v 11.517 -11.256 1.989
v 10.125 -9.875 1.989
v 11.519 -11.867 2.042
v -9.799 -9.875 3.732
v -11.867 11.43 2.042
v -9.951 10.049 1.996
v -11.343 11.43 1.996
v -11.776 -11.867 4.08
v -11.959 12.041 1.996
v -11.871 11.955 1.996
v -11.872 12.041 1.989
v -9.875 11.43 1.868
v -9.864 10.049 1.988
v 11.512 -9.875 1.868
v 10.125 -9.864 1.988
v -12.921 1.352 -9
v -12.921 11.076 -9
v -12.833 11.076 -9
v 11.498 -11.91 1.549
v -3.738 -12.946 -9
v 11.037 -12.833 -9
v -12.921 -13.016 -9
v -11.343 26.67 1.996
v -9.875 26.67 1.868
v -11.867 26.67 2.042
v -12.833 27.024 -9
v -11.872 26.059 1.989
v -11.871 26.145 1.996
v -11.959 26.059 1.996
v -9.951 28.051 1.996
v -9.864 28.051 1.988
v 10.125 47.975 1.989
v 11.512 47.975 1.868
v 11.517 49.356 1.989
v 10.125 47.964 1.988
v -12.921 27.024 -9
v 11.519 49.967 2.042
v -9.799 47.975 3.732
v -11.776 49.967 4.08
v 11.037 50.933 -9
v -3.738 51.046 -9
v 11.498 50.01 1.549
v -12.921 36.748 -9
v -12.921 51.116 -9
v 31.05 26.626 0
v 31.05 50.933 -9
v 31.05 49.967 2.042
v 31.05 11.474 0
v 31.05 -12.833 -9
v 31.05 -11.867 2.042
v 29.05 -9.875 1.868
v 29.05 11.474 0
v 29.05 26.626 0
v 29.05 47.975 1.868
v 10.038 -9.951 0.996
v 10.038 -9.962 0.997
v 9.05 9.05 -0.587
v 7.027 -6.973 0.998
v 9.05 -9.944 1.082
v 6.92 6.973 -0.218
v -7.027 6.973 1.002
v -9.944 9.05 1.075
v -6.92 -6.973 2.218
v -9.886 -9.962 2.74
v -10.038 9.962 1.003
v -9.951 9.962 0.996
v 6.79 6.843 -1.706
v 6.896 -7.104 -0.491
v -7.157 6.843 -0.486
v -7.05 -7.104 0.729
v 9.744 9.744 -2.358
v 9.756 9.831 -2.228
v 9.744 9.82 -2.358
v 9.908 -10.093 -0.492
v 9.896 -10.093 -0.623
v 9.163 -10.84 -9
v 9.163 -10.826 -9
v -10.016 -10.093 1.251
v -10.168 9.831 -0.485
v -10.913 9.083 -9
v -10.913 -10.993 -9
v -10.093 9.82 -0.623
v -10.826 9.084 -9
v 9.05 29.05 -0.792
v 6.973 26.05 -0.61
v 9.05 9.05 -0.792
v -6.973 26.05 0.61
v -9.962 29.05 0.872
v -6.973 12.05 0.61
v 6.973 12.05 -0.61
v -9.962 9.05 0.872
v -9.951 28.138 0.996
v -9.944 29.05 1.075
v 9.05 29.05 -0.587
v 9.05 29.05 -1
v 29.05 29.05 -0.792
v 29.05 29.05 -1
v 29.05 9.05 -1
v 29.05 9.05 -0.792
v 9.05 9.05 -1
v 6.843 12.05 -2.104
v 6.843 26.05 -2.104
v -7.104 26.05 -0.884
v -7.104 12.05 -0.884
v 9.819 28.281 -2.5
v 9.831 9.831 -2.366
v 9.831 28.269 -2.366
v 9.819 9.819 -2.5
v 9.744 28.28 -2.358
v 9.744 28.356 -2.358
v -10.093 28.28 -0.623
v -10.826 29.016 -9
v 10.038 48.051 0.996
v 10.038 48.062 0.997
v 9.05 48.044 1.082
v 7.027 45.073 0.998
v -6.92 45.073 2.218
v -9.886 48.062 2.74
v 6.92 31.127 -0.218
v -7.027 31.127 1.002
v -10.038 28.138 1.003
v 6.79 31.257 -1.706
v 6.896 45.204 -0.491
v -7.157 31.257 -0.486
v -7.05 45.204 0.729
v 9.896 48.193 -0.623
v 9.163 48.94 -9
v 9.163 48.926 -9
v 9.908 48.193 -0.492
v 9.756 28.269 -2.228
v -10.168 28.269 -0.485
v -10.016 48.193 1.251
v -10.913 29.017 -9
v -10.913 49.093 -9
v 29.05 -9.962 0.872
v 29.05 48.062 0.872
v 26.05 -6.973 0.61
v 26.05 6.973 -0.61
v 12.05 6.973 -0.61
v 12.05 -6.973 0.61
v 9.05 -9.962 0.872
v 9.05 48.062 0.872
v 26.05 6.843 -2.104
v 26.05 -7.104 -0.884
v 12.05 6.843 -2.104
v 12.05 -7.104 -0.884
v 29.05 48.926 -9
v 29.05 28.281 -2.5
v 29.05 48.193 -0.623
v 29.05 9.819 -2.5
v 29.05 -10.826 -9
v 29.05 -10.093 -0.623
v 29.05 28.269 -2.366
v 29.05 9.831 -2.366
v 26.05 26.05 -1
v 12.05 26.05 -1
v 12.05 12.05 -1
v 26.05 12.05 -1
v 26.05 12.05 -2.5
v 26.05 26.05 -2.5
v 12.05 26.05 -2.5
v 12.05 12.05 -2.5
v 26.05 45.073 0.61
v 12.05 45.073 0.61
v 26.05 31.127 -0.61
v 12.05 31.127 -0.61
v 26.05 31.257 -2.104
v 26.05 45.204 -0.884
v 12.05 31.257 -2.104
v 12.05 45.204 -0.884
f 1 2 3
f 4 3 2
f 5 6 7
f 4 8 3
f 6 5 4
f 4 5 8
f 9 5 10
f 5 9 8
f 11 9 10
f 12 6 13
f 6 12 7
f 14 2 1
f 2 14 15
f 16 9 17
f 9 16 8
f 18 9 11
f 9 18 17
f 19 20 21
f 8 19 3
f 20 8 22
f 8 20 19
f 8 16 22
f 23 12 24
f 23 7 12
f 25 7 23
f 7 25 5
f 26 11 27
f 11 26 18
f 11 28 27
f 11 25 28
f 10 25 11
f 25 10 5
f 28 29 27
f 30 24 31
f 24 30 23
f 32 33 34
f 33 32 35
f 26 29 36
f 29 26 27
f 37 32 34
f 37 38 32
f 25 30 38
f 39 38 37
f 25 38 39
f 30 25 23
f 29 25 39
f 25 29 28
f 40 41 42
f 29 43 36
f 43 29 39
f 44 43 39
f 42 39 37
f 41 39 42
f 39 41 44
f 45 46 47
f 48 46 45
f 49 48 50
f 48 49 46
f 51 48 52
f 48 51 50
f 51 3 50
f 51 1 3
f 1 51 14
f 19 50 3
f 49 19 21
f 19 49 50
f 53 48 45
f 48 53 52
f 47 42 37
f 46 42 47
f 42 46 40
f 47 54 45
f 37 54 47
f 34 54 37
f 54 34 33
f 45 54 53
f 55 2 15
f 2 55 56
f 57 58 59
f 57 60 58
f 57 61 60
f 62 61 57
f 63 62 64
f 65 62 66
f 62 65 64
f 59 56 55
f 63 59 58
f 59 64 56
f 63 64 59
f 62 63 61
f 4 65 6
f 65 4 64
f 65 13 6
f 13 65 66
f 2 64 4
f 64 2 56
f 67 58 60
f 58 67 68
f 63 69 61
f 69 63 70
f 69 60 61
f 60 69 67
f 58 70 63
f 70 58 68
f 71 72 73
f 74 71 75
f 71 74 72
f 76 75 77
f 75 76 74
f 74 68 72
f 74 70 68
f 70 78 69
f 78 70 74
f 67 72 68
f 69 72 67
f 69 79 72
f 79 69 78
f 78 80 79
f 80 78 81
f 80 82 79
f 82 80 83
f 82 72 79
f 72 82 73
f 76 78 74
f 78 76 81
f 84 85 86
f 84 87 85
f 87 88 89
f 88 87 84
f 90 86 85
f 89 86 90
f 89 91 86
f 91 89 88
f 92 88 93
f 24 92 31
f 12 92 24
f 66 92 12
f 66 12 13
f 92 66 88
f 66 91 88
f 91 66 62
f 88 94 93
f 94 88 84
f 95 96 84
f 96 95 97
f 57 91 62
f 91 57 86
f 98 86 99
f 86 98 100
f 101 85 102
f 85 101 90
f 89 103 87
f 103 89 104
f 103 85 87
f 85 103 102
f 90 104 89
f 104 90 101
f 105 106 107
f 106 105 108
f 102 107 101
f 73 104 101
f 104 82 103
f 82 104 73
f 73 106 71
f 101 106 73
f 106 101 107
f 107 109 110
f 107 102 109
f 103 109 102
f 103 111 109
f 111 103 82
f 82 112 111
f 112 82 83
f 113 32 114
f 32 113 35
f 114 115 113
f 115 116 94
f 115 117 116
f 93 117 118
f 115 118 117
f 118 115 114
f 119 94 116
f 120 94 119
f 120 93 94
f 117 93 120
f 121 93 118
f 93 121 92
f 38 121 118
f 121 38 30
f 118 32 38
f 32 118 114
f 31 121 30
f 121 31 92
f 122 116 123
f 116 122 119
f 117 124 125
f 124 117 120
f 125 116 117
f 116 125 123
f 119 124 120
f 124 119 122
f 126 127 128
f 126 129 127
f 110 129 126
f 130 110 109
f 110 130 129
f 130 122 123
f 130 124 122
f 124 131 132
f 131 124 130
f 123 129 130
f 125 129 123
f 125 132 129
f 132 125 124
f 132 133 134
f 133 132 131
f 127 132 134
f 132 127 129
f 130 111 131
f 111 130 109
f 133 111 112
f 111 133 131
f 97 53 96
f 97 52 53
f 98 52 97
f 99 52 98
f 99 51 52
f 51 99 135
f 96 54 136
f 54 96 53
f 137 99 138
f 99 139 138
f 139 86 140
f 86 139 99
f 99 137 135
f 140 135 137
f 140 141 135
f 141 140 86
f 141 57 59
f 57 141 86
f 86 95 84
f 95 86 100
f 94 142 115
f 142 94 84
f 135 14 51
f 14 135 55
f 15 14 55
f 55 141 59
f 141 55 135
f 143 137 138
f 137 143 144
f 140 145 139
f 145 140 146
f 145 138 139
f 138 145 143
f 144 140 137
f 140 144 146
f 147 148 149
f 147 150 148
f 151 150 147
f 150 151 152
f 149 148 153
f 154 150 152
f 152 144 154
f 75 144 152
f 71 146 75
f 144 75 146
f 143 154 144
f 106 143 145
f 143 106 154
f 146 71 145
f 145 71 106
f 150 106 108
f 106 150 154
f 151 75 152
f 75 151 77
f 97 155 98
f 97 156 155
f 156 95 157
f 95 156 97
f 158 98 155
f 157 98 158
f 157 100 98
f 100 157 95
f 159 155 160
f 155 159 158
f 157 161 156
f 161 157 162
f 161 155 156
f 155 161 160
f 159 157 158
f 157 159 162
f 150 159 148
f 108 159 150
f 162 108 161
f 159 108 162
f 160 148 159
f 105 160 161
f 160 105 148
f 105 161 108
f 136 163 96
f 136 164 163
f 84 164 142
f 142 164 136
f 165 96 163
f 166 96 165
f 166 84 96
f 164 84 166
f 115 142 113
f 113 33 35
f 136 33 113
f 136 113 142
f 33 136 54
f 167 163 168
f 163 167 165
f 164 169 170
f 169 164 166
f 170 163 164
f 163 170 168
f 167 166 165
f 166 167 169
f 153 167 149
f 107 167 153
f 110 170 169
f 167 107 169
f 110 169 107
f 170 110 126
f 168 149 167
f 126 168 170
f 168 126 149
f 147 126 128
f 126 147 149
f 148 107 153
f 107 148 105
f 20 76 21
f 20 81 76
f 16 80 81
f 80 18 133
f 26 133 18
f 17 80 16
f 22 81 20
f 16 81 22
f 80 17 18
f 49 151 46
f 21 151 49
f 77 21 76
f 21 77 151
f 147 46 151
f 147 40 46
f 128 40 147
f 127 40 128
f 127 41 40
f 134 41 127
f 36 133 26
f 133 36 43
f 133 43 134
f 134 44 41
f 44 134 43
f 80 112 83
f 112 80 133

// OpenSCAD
// Generated by SolidPython 1.1.3 on 2024-12-14 22:49:28


difference() {
	union() {
		translate(v = [0.0000000000, 0.0000000000, 1]) {
			rotate(a = [-5, 5, 0]) {
				translate(v = [-12, -12, -19]) {
					cube(size = [24, 24, 20]);
				}
			}
		}
		translate(v = [0.0000000000, 19.0500000000, 0]) {
			rotate(a = [0, 5, 0]) {
				translate(v = [-12, -12, -19]) {
					cube(size = [24, 24, 20]);
				}
			}
		}
		translate(v = [0.0000000000, 38.1000000000, 1]) {
			rotate(a = [5, 5, 0]) {
				translate(v = [-12, -12, -19]) {
					cube(size = [24, 24, 20]);
				}
			}
		}
		translate(v = [19.0500000000, 0.0000000000, 0]) {
			rotate(a = [-5, 0, 0]) {
				translate(v = [-12, -12, -19]) {
					cube(size = [24, 24, 20]);
				}
			}
		}
		translate(v = [19.0500000000, 19.0500000000, -1]) {
			rotate(a = [0, 0, 0]) {
				translate(v = [-12, -12, -19]) {
					cube(size = [24, 24, 20]);
				}
			}
		}
		translate(v = [19.0500000000, 38.1000000000, 0]) {
			rotate(a = [5, 0, 0]) {
				translate(v = [-12, -12, -19]) {
					cube(size = [24, 24, 20]);
				}
			}
		}
	}
	union() {
		translate(v = [0.0000000000, 0.0000000000, 1]) {
			rotate(a = [-5, 5, 0]) {
				union() {
					translate(v = [-10, -10, 0]) {
						cube(size = [20, 20, 10]);
					}
					translate(v = [-7, -7, -49]) {
						cube(size = [14, 14, 50]);
					}
					translate(v = [-10, -10, -51.5000000000]) {
						cube(size = [20, 20, 50]);
					}
				}
			}
		}
		translate(v = [0.0000000000, 19.0500000000, 0]) {
			rotate(a = [0, 5, 0]) {
				union() {
					translate(v = [-10, -10, 0]) {
						cube(size = [20, 20, 10]);
					}
					translate(v = [-7, -7, -49]) {
						cube(size = [14, 14, 50]);
					}
					translate(v = [-10, -10, -51.5000000000]) {
						cube(size = [20, 20, 50]);
					}
				}
			}
		}
		translate(v = [0.0000000000, 38.1000000000, 1]) {
			rotate(a = [5, 5, 0]) {
				union() {
					translate(v = [-10, -10, 0]) {
						cube(size = [20, 20, 10]);
					}
					translate(v = [-7, -7, -49]) {
						cube(size = [14, 14, 50]);
					}
					translate(v = [-10, -10, -51.5000000000]) {
						cube(size = [20, 20, 50]);
					}
				}
			}
		}
		translate(v = [19.0500000000, 0.0000000000, 0]) {
			rotate(a = [-5, 0, 0]) {
				union() {
					translate(v = [-10, -10, 0]) {
						cube(size = [20, 20, 10]);
					}
					translate(v = [-7, -7, -49]) {
						cube(size = [14, 14, 50]);
					}
					translate(v = [-10, -10, -51.5000000000]) {
						cube(size = [20, 20, 50]);
					}
				}
			}
		}
		translate(v = [19.0500000000, 19.0500000000, -1]) {
			rotate(a = [0, 0, 0]) {
				union() {
					translate(v = [-10, -10, 0]) {
						cube(size = [20, 20, 10]);
					}
					translate(v = [-7, -7, -49]) {
						cube(size = [14, 14, 50]);
					}
					translate(v = [-10, -10, -51.5000000000]) {
						cube(size = [20, 20, 50]);
					}
				}
			}
		}
		translate(v = [19.0500000000, 38.1000000000, 0]) {
			rotate(a = [5, 0, 0]) {
				union() {
					translate(v = [-10, -10, 0]) {
						cube(size = [20, 20, 10]);
					}
					translate(v = [-7, -7, -49]) {
						cube(size = [14, 14, 50]);
					}
					translate(v = [-10, -10, -51.5000000000]) {
						cube(size = [20, 20, 50]);
					}
				}
			}
		}
	}
	translate(v = [-20, -20, -29]) {
		cube(size = [100, 100, 20]);
	}
}
/***********************************************
*********      SolidPython code:      **********
************************************************
 
from solid import *

# ケースになる部分
body = translate([-12, -12, -19])(
    cube([24, 24, 20])
)

# ケースからカットする部分
hole = union()(
    # スイッチの上側をカットする部分
    translate([-10, -10, 0])(
        cube([20, 20, 10])
    ),
    # スイッチの穴
    translate([-7, -7, -49])(
        cube([14, 14, 50])
    ),
    # スイッチプレートの下側
    translate([-10, -10, -51.5])(
        cube([20, 20, 50])
    ),
)

# スイッチの位置 x, y, z と角度[度] rx, ry
position = [
    [19.05 * 0, 19.05 * 0,  1, -5, 5],
    [19.05 * 0, 19.05 * 1,  0,  0, 5],
    [19.05 * 0, 19.05 * 2,  1,  5, 5],
    [19.05 * 1, 19.05 * 0,  0, -5, 0],
    [19.05 * 1, 19.05 * 1, -1,  0, 0],
    [19.05 * 1, 19.05 * 2,  0,  5, 0],
]

# ケースを合体
case6 = union()(
    [
        translate([x, y, z])(
            rotate([rx, ry, 0])(body)
        ) for x, y, z, rx, ry in position
    ]
)

# カット部分を合体
hole6 = union()(
    [
        translate([x, y, z])(
            rotate([rx, ry, 0])(hole)
        ) for x, y, z, rx, ry in position
    ]
)

# ケースの底を平らにカットするための立方体
bottom = translate([-20, -20, -29])(
  cube([100, 100, 20])
)

# ケースからカット部分を引く
kbd = difference()(
  case6,
  hole6,
  bottom
)

scad_render_to_file(kbd, '7_6keys-comp.scad')
 
 
************************************************/
